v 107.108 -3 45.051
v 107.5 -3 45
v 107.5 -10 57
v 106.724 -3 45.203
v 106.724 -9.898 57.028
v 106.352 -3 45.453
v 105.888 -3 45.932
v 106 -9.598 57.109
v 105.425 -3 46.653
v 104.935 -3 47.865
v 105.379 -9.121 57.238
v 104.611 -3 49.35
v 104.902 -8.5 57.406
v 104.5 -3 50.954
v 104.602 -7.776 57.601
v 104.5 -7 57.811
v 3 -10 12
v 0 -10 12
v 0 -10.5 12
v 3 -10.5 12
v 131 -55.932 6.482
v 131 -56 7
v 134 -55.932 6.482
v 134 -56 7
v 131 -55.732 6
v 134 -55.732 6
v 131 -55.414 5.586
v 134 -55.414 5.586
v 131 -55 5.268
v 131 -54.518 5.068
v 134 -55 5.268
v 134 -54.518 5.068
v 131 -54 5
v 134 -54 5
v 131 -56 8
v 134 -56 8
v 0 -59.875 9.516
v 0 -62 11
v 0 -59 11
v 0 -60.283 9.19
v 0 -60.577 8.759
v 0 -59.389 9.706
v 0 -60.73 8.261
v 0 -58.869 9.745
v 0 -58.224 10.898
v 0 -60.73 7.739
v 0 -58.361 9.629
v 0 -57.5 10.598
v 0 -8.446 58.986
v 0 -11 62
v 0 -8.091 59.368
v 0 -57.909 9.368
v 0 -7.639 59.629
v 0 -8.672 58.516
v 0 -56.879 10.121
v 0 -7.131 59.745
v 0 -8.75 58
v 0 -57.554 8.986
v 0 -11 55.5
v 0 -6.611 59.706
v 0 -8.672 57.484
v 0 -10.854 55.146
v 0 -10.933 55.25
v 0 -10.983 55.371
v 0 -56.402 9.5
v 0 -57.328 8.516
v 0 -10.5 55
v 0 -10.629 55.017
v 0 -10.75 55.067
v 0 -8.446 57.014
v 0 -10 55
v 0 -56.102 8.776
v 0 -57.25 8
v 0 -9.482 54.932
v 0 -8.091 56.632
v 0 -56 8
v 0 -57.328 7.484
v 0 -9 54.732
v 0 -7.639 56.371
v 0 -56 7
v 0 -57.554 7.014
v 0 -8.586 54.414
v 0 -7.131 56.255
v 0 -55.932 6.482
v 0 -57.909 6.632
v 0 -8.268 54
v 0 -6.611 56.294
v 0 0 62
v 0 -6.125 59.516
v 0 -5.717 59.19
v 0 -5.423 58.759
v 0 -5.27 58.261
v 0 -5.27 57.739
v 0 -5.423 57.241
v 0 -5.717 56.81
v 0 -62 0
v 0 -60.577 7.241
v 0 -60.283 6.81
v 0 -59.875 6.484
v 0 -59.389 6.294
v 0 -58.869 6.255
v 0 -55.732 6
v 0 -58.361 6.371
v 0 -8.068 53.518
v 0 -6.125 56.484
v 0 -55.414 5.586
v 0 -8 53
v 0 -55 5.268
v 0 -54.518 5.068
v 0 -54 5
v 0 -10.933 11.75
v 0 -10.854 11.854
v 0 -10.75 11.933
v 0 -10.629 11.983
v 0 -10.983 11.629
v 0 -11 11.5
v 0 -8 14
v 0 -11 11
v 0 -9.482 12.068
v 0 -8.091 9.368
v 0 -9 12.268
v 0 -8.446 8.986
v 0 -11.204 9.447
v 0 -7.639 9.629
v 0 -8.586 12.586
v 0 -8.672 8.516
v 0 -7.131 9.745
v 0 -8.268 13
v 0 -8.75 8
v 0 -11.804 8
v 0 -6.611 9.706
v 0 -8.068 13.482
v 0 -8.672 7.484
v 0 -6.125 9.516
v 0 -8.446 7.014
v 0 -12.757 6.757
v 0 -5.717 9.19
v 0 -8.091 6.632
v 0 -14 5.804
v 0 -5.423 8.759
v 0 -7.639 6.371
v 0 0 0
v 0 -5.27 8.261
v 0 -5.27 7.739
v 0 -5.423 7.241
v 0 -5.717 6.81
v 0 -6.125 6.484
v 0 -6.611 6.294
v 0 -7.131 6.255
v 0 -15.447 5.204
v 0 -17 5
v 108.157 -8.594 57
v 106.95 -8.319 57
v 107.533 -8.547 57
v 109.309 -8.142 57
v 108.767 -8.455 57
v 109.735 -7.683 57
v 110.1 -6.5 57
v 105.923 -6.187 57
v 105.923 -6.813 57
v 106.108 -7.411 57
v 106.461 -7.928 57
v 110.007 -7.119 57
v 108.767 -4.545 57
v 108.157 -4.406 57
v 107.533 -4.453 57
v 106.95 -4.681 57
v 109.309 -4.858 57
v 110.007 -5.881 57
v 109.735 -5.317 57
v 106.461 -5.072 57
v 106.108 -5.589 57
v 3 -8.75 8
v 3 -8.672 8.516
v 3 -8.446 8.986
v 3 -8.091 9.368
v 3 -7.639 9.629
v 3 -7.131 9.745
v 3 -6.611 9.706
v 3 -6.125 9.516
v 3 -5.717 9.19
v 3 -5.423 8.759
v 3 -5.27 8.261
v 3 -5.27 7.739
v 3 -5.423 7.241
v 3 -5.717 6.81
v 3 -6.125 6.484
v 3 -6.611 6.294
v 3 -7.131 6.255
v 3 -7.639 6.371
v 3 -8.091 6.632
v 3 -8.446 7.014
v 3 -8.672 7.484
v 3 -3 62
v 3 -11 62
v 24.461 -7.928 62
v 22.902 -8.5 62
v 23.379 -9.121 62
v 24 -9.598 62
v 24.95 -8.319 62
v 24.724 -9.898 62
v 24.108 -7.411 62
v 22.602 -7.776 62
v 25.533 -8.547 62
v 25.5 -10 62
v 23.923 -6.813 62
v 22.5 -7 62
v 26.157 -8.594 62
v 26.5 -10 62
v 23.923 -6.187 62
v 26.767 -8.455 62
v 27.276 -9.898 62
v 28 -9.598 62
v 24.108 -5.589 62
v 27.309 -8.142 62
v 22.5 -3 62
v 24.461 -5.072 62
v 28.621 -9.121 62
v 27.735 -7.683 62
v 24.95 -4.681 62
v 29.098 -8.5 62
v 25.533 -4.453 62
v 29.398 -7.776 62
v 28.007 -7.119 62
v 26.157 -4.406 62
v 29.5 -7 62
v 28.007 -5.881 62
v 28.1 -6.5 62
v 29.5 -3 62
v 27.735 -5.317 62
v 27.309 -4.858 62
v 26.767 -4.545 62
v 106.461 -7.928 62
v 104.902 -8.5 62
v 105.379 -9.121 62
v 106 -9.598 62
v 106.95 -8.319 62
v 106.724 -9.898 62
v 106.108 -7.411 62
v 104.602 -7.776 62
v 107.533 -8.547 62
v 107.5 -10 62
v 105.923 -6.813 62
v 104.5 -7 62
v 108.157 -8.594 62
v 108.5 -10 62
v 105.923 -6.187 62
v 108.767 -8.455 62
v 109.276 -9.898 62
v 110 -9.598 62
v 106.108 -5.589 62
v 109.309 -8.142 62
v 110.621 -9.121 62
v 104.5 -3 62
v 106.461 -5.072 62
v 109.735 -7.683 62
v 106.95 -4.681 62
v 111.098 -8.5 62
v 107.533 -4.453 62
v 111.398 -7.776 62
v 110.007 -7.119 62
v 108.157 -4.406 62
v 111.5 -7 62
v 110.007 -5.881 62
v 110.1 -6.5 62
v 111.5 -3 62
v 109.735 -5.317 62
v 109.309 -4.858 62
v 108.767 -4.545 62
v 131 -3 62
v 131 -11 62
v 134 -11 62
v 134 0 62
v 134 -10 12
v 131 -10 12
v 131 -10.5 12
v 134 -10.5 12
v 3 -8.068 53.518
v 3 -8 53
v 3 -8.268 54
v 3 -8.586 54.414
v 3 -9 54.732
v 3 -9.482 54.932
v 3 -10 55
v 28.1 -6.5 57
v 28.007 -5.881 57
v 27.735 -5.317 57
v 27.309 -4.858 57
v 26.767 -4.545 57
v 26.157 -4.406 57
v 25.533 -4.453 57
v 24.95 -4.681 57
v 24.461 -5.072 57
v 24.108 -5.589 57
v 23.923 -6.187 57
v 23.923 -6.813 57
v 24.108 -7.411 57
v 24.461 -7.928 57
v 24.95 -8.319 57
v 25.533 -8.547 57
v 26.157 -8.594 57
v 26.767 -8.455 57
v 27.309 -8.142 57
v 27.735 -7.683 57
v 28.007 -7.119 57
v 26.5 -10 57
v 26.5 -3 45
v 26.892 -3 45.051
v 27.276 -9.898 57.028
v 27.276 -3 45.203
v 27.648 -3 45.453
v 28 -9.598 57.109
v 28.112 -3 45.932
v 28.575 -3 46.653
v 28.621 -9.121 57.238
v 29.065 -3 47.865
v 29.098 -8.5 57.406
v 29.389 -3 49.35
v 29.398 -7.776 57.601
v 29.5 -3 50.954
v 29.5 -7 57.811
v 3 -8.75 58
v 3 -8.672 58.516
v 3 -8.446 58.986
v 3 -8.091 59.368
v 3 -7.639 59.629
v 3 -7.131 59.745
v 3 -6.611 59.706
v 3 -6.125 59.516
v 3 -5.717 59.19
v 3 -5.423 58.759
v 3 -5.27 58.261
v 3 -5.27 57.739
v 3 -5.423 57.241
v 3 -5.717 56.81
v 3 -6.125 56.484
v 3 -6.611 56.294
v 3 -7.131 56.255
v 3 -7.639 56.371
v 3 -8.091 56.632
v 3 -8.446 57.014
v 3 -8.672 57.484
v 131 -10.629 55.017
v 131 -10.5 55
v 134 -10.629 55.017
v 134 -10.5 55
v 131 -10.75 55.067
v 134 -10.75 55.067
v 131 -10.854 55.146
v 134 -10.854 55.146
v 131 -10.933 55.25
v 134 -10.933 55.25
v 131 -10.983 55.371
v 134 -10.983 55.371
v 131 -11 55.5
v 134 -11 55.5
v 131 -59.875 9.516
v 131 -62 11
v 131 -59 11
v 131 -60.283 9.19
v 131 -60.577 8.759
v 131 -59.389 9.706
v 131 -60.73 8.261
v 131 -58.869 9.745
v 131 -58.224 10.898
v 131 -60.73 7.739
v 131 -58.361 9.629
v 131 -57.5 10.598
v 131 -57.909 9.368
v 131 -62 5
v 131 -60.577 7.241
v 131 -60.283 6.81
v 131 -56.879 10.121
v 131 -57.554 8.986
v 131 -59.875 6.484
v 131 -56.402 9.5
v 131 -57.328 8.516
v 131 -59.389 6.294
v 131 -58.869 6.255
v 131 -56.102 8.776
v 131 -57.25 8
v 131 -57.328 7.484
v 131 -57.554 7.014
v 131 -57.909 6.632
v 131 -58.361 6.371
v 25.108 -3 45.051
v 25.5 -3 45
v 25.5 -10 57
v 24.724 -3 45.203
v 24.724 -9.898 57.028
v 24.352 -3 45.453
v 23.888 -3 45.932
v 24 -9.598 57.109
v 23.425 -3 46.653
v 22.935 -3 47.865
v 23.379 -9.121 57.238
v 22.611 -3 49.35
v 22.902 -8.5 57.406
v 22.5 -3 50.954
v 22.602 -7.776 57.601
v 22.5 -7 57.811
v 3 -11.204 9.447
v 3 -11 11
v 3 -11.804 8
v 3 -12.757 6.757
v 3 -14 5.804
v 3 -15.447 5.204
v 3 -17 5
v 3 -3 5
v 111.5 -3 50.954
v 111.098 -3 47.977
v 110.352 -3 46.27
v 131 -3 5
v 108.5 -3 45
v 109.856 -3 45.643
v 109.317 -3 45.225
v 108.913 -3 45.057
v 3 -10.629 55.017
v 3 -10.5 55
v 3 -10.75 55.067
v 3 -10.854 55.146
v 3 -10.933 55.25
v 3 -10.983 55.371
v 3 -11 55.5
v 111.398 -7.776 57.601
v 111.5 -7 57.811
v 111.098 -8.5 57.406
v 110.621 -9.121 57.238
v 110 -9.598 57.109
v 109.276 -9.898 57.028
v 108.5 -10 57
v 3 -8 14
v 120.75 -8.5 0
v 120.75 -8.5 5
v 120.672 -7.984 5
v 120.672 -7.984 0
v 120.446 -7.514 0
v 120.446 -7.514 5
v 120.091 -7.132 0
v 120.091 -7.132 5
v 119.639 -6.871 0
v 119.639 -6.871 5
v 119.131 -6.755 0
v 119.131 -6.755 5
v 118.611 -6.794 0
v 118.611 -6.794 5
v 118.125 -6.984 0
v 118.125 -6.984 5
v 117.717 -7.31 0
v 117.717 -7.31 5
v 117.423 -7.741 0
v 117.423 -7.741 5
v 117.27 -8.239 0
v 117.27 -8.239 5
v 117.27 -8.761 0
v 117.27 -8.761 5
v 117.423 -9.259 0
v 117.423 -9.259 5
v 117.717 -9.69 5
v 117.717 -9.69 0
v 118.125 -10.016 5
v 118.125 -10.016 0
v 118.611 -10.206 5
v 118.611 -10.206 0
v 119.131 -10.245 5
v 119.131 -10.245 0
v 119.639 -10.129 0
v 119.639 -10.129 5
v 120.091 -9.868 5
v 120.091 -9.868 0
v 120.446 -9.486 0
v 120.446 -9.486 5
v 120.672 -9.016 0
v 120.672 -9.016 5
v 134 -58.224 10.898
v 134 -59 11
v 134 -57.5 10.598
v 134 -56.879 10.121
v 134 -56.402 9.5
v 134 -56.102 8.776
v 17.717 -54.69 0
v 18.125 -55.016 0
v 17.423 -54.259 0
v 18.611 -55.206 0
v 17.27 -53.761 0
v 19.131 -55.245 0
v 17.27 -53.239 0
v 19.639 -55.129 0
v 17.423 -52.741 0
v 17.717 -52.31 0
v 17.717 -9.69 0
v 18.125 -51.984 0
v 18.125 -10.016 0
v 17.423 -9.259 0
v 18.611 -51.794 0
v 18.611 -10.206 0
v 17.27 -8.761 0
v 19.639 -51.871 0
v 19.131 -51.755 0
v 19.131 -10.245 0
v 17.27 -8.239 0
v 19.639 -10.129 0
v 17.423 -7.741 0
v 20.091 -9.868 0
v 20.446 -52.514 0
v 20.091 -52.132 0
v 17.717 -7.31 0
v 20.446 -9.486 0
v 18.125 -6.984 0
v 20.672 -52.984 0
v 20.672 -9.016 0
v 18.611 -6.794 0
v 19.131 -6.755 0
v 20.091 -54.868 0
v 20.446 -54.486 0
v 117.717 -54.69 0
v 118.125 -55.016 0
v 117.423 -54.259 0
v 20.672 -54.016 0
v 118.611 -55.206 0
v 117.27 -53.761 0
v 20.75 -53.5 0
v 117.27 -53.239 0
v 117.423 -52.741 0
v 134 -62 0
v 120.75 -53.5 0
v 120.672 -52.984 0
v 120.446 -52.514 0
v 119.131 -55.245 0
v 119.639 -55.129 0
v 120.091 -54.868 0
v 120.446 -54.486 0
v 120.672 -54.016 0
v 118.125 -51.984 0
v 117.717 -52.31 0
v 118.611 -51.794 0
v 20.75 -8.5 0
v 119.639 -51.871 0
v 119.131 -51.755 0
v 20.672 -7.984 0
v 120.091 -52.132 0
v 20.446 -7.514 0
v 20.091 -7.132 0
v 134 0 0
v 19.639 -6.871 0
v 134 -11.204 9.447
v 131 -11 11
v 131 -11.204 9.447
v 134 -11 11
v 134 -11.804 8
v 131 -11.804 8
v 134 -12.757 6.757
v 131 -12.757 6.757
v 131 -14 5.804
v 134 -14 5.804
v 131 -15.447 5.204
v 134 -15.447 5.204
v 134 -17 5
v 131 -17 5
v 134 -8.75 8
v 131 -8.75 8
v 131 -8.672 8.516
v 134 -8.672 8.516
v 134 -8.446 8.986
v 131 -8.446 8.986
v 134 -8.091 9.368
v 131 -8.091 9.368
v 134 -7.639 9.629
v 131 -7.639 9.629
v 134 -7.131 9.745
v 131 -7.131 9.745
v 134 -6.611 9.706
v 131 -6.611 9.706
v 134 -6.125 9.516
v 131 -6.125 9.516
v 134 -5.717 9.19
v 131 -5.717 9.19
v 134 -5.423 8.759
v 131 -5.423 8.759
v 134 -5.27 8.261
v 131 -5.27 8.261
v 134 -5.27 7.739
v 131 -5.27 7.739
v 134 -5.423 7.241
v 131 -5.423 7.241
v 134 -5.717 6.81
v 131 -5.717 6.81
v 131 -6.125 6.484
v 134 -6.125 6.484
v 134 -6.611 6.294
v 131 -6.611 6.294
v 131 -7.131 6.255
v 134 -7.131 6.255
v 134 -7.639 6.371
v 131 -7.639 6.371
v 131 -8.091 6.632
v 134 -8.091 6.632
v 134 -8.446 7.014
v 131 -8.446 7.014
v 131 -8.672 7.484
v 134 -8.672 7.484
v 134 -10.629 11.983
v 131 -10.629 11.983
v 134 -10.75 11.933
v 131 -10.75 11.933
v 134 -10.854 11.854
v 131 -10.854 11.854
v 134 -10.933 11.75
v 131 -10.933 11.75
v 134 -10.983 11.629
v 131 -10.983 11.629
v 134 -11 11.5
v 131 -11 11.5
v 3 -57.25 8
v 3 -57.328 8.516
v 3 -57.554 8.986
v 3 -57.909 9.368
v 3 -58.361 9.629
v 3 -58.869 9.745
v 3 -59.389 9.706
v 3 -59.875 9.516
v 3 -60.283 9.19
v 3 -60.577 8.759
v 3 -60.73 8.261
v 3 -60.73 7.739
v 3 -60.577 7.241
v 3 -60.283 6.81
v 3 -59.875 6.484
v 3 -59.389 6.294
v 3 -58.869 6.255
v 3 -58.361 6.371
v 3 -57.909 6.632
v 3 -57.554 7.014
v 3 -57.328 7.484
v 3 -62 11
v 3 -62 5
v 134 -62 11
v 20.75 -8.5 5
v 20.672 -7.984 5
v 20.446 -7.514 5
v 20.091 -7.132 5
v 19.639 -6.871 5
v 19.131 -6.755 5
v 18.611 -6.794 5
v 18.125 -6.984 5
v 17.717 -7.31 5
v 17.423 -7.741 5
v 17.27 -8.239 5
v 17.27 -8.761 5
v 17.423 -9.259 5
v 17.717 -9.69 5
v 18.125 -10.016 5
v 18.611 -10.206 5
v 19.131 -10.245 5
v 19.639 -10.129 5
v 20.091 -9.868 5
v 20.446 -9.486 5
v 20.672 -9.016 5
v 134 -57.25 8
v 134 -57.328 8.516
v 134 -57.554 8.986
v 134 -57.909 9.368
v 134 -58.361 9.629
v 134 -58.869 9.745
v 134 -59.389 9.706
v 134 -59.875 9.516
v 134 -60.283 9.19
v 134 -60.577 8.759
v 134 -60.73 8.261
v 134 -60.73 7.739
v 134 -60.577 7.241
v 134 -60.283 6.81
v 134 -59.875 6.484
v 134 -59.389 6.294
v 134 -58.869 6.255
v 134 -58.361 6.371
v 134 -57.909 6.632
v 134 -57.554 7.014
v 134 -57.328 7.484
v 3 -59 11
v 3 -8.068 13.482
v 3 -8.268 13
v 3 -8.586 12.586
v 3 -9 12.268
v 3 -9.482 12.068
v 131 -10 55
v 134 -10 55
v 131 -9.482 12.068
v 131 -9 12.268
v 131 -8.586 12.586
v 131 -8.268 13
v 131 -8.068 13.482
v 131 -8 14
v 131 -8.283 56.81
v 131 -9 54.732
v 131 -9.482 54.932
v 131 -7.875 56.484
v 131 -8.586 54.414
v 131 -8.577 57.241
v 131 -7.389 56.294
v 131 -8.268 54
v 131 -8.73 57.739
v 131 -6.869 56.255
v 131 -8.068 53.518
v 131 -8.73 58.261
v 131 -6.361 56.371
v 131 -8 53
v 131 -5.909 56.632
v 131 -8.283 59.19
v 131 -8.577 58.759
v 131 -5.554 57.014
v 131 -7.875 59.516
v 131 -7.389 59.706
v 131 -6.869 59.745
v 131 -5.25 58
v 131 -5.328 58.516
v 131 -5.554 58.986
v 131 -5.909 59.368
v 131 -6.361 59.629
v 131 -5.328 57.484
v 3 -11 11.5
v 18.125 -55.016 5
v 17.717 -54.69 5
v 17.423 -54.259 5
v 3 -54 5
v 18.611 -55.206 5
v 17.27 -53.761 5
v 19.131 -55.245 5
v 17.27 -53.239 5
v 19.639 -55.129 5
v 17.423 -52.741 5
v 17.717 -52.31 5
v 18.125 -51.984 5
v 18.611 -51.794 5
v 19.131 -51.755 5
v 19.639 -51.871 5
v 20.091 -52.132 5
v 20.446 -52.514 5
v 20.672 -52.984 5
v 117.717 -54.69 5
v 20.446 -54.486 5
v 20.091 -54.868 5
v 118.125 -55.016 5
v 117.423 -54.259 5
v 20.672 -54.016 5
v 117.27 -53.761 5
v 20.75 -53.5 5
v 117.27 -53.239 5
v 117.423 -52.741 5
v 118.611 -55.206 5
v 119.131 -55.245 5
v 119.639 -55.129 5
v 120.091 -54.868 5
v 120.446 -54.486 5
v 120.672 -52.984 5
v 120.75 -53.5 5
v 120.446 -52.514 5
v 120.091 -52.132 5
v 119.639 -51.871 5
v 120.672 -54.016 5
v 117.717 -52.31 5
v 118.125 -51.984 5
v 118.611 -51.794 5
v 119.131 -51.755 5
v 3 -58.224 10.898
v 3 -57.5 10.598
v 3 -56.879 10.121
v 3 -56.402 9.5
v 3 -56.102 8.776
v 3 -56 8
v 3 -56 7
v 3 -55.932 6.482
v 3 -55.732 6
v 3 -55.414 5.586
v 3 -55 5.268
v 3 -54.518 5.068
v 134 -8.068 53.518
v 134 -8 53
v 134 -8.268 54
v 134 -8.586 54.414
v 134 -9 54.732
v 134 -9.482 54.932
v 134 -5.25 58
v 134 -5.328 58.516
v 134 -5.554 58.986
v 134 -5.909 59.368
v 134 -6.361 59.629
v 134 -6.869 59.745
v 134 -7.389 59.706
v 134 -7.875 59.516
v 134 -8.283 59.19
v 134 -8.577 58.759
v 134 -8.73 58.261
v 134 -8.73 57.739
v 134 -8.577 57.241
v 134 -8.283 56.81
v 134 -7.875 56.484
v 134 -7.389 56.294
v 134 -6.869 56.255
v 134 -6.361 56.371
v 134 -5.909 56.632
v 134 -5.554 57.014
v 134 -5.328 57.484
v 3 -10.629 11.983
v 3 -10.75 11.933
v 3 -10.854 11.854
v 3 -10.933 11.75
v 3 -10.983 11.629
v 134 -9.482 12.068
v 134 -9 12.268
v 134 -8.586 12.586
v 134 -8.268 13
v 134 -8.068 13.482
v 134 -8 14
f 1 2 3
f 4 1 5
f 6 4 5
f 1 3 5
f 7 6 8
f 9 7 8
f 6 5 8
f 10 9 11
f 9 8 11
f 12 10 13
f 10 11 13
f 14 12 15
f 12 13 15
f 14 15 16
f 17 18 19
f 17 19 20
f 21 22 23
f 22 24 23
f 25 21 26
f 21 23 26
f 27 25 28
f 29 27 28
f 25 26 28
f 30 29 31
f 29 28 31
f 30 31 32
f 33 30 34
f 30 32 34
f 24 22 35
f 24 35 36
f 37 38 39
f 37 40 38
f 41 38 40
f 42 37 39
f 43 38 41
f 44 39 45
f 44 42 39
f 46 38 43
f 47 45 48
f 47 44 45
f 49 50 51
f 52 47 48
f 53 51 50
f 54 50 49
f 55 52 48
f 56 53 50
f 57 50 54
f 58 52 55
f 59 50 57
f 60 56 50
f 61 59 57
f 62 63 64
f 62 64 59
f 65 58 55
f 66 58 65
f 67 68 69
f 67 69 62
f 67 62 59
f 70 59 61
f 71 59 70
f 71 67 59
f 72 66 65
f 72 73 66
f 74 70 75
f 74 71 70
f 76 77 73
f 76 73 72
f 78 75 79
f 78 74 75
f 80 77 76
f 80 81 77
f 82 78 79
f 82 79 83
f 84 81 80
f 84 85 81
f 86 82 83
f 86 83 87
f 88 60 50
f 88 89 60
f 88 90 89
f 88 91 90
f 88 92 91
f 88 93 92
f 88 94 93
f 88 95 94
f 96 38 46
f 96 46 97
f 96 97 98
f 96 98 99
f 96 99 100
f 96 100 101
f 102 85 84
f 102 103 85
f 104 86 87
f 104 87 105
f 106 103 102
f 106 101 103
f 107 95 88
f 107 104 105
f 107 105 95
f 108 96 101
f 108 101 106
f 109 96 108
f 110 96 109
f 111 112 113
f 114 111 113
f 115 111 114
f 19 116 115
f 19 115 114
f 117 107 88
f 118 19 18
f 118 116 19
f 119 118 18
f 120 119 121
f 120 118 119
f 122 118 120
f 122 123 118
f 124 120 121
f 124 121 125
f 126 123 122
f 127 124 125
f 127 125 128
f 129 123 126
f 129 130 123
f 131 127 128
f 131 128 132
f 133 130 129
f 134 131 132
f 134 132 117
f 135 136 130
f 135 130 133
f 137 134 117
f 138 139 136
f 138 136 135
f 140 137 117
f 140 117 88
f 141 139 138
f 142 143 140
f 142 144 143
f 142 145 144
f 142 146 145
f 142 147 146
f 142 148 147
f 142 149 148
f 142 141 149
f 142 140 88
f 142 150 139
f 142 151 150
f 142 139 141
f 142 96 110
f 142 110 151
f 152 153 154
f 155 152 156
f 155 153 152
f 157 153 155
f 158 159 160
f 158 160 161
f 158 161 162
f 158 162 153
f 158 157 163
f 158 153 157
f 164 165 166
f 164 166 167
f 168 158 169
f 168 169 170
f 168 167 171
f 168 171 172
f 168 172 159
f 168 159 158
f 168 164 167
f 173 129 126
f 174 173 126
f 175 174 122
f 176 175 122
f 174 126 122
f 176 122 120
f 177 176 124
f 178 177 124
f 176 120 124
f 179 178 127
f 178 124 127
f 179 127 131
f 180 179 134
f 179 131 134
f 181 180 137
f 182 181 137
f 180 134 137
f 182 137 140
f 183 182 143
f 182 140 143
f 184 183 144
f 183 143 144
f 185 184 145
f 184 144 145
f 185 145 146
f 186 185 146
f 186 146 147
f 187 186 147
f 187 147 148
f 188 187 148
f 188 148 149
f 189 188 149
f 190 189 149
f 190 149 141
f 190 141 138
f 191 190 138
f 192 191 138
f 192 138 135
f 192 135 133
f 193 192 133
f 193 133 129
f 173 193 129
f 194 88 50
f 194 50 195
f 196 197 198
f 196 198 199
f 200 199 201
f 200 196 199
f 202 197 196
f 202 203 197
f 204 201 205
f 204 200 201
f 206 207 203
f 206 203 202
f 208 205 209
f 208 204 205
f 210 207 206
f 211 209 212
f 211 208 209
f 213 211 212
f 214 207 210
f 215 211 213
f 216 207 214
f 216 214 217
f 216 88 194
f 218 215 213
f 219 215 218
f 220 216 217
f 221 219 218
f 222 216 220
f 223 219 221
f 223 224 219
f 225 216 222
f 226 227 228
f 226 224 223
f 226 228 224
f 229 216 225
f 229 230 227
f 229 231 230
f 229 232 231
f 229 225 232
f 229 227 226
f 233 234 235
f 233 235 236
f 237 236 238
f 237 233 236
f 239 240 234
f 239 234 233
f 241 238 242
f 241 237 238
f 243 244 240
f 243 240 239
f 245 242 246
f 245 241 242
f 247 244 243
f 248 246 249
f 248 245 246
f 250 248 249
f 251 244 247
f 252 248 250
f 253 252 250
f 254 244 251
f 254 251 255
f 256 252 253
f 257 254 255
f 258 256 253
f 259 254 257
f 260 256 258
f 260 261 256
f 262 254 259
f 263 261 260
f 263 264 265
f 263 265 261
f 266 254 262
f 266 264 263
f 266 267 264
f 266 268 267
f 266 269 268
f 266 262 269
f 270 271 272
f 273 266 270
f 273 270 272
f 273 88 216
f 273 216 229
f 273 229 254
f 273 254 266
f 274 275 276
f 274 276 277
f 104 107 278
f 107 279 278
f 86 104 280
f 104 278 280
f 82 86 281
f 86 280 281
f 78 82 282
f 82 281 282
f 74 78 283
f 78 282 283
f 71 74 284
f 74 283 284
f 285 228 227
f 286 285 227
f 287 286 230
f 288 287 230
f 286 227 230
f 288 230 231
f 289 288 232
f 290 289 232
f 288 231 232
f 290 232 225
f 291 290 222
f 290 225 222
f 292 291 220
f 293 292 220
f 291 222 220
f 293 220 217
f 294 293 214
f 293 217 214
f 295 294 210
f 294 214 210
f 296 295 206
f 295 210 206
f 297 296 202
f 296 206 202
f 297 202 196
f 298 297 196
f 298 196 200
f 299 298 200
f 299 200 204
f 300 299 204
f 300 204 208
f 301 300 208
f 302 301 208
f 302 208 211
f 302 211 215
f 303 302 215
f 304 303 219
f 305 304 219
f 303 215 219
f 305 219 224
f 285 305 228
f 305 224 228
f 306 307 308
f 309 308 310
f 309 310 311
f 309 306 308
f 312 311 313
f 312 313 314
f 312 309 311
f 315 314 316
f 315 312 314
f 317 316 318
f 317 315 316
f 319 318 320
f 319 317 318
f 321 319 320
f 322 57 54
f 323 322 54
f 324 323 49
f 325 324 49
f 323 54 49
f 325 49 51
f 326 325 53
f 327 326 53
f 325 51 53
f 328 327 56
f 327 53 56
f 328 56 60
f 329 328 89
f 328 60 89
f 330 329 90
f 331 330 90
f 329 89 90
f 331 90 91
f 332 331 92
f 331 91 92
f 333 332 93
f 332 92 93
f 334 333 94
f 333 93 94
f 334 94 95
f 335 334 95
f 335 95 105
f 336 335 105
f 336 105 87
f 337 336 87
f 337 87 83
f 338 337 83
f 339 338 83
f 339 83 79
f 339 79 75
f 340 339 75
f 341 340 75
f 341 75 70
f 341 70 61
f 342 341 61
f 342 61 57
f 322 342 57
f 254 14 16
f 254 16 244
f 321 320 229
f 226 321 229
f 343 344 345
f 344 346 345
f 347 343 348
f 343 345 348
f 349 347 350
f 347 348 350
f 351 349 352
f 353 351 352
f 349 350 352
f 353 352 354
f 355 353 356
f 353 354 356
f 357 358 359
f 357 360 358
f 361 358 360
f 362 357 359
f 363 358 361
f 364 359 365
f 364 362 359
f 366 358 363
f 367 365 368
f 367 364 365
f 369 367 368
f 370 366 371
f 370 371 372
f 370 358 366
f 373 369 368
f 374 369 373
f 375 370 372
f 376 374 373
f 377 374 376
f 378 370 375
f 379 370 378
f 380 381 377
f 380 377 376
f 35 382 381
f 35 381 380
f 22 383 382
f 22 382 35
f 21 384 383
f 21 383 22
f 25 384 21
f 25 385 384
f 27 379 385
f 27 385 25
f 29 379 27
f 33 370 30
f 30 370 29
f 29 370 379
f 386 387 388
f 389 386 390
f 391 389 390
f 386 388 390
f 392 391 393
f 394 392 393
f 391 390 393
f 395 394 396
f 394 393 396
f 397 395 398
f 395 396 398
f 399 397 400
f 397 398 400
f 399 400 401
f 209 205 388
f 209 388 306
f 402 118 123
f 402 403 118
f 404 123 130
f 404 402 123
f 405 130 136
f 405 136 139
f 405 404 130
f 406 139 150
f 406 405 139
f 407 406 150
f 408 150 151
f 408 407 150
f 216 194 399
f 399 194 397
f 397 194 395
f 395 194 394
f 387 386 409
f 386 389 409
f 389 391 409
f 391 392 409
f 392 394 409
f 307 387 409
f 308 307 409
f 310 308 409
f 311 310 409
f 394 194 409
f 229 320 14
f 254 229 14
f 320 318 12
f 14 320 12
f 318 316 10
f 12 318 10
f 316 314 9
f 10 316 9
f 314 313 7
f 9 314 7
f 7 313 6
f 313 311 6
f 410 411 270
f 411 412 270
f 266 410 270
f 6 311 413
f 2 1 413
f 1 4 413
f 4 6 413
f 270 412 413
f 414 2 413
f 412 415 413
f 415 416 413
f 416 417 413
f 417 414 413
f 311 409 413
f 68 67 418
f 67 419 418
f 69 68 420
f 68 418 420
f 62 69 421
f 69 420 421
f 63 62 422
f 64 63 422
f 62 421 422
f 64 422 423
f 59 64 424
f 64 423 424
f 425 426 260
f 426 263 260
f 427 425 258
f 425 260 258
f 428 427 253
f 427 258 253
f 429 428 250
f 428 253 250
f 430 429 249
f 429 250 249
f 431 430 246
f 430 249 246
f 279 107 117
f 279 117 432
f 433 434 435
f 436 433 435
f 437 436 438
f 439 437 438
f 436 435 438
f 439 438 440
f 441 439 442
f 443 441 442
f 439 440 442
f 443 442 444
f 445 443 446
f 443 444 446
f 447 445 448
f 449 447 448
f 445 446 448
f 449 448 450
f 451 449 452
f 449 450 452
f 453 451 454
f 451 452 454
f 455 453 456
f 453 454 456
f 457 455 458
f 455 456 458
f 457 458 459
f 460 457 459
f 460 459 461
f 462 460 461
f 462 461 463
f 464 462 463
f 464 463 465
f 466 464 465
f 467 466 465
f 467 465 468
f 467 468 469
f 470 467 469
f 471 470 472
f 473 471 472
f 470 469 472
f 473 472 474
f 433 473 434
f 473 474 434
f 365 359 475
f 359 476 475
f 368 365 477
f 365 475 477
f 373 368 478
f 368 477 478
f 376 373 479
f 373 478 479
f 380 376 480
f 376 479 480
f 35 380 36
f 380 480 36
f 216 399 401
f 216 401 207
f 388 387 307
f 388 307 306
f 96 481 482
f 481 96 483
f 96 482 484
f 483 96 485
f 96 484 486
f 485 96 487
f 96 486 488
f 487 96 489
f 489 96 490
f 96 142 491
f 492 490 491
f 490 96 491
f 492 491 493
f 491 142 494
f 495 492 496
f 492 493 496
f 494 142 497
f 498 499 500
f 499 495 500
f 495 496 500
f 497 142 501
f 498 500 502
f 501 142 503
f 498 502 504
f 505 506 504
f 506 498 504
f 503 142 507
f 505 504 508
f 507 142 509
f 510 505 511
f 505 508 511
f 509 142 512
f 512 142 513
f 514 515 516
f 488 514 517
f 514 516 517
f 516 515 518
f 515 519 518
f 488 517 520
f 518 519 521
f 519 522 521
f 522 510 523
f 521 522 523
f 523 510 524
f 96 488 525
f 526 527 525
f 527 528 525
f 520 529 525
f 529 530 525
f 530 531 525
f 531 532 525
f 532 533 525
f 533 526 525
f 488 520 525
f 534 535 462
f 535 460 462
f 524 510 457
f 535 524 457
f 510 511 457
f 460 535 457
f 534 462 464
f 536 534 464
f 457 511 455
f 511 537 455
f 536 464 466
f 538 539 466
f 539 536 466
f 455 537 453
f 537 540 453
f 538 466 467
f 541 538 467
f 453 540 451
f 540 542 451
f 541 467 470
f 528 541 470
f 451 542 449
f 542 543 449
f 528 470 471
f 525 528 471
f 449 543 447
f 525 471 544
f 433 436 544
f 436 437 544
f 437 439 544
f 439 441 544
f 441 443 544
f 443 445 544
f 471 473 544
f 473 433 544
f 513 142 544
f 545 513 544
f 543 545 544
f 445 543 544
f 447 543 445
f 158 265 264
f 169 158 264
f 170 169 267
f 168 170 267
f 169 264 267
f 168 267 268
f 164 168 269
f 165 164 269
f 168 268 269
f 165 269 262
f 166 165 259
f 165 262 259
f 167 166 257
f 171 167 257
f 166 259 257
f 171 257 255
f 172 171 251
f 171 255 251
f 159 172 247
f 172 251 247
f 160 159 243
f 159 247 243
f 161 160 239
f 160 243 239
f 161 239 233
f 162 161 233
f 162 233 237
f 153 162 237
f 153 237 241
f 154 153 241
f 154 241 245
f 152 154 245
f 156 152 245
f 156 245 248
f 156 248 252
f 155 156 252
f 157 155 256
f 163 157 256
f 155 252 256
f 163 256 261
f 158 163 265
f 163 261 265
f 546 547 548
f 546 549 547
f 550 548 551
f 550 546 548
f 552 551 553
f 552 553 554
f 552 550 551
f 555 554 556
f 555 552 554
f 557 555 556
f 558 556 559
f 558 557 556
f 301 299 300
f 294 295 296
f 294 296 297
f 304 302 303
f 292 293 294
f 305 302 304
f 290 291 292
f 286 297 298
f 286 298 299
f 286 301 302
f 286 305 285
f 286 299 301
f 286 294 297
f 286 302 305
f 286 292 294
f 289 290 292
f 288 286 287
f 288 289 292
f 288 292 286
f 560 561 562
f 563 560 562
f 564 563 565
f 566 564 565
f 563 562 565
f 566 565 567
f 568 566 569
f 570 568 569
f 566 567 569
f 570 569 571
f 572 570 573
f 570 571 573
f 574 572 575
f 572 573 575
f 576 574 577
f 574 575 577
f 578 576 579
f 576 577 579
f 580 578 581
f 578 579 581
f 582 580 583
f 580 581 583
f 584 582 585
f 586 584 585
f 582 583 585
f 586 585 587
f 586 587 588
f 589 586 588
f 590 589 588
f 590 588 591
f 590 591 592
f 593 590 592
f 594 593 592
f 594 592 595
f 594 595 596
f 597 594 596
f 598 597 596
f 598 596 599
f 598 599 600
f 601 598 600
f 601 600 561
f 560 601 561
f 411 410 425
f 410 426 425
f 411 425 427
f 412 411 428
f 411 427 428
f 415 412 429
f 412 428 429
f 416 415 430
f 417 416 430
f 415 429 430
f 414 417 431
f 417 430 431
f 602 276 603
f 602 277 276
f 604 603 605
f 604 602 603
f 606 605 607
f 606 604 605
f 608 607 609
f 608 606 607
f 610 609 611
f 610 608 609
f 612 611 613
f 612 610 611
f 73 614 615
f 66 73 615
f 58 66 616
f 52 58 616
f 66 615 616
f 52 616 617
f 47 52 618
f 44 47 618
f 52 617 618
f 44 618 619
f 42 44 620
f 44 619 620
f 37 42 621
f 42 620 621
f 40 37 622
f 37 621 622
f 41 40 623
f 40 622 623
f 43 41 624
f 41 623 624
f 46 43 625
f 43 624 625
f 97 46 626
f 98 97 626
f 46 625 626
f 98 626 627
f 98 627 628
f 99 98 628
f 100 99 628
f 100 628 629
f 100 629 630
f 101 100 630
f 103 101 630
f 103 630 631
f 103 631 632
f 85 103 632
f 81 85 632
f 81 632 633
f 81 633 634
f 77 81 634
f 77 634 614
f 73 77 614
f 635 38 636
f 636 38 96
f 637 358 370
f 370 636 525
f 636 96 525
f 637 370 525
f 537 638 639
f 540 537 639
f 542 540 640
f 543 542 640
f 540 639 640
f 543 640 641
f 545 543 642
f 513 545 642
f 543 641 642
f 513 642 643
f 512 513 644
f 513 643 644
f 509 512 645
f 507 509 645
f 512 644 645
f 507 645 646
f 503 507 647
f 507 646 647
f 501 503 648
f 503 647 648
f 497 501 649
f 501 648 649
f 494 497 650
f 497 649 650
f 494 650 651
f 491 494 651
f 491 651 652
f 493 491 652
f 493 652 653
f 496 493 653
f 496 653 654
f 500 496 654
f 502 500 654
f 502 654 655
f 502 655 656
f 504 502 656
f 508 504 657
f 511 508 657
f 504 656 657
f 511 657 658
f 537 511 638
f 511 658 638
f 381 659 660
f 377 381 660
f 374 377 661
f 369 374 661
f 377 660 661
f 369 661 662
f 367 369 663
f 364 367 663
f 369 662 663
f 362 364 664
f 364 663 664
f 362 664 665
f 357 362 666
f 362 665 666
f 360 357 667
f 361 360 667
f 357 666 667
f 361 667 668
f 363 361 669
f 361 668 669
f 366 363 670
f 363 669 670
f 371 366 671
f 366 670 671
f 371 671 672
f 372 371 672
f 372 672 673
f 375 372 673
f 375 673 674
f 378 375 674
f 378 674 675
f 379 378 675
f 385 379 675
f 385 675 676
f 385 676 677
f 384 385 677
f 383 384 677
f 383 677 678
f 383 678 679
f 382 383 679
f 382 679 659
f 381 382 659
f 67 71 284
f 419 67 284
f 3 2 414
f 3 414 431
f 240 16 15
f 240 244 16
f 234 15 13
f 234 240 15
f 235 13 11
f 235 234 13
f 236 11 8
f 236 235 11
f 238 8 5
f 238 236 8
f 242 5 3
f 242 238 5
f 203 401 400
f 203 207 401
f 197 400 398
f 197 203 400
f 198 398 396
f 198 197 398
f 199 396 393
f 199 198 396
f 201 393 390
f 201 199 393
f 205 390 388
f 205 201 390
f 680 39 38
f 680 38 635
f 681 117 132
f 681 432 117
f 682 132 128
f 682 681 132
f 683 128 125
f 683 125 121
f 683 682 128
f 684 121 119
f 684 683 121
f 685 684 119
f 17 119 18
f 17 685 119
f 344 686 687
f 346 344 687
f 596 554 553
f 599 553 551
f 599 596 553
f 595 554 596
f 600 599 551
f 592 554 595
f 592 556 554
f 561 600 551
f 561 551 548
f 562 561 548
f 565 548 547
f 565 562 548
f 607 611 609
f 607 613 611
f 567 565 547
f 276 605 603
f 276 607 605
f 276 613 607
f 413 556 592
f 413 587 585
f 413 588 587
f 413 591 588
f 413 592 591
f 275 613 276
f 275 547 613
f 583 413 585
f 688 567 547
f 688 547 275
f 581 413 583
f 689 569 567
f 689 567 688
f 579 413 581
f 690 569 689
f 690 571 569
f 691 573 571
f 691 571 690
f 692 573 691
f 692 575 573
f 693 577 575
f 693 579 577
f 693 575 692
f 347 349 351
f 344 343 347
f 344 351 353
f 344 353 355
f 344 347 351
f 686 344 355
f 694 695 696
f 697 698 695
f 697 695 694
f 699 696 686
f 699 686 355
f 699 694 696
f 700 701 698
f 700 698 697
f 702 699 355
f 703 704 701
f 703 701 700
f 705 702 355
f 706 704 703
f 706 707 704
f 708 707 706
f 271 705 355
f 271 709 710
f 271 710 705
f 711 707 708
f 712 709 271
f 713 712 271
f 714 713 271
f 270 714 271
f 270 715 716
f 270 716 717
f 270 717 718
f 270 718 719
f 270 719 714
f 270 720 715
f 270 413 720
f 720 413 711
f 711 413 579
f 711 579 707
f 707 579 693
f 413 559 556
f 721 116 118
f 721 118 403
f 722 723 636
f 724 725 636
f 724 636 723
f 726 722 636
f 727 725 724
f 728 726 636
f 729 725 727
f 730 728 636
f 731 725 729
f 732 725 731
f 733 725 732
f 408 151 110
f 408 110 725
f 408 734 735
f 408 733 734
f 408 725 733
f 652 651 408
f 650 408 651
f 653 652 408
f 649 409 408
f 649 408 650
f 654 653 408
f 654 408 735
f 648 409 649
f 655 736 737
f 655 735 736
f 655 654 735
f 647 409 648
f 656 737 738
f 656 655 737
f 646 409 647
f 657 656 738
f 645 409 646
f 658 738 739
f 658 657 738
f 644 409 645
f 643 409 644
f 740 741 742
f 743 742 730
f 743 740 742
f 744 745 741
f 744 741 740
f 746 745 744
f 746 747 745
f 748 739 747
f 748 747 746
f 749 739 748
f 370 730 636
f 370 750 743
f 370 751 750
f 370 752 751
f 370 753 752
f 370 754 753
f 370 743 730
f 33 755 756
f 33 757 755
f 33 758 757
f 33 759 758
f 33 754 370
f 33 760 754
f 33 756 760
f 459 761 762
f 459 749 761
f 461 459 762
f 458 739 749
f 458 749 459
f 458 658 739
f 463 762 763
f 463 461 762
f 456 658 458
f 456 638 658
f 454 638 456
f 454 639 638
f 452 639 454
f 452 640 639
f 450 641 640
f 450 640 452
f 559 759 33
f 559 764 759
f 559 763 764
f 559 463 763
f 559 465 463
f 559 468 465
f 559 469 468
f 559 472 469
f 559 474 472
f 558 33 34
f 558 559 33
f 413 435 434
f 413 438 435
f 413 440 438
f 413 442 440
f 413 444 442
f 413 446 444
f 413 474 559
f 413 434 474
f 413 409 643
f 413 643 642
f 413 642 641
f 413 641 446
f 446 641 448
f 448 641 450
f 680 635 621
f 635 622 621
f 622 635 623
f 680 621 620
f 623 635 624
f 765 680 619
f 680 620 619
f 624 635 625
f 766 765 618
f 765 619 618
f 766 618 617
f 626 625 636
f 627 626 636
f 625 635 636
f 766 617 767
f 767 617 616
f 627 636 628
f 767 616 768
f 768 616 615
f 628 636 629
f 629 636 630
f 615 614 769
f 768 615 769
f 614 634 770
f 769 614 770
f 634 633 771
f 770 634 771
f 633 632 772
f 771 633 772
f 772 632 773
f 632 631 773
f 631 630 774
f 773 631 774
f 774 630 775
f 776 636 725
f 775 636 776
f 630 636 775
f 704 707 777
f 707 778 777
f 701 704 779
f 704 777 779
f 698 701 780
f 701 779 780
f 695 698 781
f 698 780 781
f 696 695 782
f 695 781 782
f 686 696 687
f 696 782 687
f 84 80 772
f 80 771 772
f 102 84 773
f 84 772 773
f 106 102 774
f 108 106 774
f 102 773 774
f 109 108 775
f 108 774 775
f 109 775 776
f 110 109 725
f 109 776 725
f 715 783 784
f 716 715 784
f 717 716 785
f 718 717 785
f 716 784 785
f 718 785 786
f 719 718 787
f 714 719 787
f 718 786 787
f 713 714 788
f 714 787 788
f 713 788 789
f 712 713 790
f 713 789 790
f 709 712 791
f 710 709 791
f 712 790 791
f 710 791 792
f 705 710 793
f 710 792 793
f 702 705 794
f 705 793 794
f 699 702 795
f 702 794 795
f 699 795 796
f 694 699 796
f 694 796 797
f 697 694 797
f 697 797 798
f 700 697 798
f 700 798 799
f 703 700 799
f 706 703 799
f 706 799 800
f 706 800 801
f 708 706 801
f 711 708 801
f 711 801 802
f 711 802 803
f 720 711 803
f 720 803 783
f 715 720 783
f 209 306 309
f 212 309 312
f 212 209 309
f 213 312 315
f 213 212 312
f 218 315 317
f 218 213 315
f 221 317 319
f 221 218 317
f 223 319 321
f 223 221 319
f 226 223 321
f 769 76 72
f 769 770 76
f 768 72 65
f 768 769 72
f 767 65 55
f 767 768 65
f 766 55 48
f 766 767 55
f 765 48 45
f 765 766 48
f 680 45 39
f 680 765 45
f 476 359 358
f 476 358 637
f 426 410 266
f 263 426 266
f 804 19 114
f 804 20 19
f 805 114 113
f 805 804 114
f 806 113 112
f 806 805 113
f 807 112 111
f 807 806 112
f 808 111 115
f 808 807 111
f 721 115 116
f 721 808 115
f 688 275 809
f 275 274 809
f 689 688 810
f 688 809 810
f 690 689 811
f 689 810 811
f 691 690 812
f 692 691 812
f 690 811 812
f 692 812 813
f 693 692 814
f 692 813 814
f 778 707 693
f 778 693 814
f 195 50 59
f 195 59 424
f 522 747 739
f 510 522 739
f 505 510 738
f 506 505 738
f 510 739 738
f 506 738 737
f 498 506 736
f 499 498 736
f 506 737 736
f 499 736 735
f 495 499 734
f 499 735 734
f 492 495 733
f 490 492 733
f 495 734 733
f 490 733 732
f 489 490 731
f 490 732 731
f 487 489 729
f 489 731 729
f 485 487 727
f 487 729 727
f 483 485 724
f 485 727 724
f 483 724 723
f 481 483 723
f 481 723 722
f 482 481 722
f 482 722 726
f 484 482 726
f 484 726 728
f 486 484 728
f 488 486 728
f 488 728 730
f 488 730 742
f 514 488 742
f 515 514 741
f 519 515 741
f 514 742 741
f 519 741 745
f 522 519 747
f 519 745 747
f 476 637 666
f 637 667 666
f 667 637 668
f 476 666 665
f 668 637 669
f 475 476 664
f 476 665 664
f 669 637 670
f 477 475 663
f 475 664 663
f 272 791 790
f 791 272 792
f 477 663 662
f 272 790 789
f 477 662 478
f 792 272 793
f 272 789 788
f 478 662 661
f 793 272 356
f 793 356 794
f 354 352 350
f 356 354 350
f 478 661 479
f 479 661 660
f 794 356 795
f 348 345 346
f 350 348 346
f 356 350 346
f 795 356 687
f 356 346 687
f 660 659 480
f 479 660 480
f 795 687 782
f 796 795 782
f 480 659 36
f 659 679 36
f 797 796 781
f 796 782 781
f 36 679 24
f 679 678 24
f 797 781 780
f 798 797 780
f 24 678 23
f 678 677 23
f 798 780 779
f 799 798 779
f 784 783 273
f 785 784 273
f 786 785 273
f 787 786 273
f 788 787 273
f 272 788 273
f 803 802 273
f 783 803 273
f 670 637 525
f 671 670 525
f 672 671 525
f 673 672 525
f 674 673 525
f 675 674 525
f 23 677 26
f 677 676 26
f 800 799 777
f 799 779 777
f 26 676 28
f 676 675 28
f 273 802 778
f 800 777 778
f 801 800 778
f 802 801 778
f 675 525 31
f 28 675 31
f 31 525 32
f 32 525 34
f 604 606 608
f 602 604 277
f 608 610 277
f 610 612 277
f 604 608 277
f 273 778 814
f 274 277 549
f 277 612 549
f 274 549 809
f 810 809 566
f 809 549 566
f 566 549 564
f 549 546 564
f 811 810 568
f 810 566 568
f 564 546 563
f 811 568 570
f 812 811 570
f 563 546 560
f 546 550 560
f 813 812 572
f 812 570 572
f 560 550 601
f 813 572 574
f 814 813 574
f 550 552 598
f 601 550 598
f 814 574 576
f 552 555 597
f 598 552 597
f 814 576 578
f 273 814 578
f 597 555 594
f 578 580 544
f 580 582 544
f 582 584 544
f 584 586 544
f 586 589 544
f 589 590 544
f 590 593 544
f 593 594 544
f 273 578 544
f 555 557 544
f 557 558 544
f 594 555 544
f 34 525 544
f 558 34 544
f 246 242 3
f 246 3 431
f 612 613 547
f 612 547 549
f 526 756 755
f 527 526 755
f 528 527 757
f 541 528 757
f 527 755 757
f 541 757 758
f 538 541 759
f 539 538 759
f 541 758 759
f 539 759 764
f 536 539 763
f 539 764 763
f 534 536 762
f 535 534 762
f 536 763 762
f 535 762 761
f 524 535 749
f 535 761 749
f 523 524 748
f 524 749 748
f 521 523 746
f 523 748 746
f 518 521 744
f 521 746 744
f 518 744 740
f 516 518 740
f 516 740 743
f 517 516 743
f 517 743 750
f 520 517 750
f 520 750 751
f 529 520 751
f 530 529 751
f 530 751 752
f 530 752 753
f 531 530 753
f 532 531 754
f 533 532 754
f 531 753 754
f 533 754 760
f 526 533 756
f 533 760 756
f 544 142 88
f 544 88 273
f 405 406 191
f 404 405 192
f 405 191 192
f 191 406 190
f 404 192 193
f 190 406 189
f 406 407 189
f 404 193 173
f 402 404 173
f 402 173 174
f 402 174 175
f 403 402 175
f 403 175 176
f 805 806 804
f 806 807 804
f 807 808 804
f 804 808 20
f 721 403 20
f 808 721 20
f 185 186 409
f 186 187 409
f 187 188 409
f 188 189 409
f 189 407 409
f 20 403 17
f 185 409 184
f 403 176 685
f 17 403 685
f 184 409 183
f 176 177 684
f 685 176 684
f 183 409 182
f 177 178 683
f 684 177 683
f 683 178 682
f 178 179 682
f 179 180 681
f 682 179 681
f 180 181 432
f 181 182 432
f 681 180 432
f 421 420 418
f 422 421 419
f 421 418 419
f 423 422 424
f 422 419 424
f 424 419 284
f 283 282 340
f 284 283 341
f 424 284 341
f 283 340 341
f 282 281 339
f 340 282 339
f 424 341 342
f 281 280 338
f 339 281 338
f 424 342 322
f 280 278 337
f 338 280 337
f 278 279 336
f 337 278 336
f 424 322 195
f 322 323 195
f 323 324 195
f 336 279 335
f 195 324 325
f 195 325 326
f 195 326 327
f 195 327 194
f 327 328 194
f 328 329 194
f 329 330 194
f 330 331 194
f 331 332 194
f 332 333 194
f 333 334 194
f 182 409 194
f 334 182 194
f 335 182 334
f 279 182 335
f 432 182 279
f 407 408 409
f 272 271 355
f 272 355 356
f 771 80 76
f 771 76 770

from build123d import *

# Parameters (mm, degrees)
SKETCH_W        = 134
SKETCH_H        = 62
PAD_DEPTH       = 5
SKETCH001_W     = 134
SKETCH001_H     = 3
PAD001_DEPTH    = 57
SKETCH002_W     = 7
SKETCH002_H     = 17
PAD002_DEPTH    = 7
POCKET_DEPTH    = 89
FILLET_R        = 3
SKETCH004_W     = 3
SKETCH004_H     = 57
PAD003_DEPTH    = 5
SKETCH005_W     = 3
SKETCH005_H     = 7
PAD004_DEPTH    = 3
SKETCH006_R     = 1.75
POCKET001_DEPTH = 134.001
SKETCH007_R     = 1.75
POCKET002_DEPTH = 5
SKETCH008_R     = 1.75
POCKET003_DEPTH = 5
SKETCH009_W     = 3
SKETCH009_H     = 6
PAD005_DEPTH    = 6
SKETCH010_R     = 1.75
POCKET004_DEPTH = 134.001
FILLET001_R     = 3
FILLET002_R     = 2
FILLET003_R     = 3
FILLET004_R     = 2
FILLET005_R     = 6
FILLET006_R     = 6
FILLET007_R     = 2
FILLET008_R     = 0.5
FILLET009_R     = 2
FILLET010_R     = 0.5
FILLET011_R     = 2
FILLET012_R     = 0.5
FILLET013_R     = 2
FILLET014_R     = 0.5
SKETCH011_R     = 1.75
POCKET005_DEPTH = 5
SKETCH012_R     = 2.1
POCKET006_DEPTH = 5


with BuildPart() as part:
    # Sketch → Pad (new body)
    with BuildSketch(Plane.XY):
        with Locations((67, -31)):
            Rectangle(SKETCH_W, SKETCH_H)
    extrude(amount=PAD_DEPTH)

    # Sketch001 (on Face6 of Pad) → Pad001 (join)
    with BuildSketch(Plane.XY.offset(5)):
        with Locations((67, -1.5)):
            Rectangle(SKETCH001_W, SKETCH001_H)
    extrude(amount=PAD001_DEPTH)

    # Sketch002 (on Face11 of Pad001) → Pad002 (join)
    with BuildSketch(Plane.XZ.offset(3)):
        with Locations((26, 53.5)):
            Rectangle(SKETCH002_W, SKETCH002_H)
        with Locations((108, 53.5)):
            Rectangle(SKETCH002_W, SKETCH002_H)
    extrude(amount=PAD002_DEPTH)

    # Sketch003 (on Face14 of Pad002) → Pocket (cut)
    with BuildSketch(Plane(origin=(22.5, 0, 0), x_dir=(0, -1, 0), z_dir=(-1, 0, 0))):
        Polygon((3, 45), (10, 57), (10, 45), align=None)
    extrude(amount=-POCKET_DEPTH, mode=Mode.SUBTRACT)

    # Fillet
    fillet_edges = [part.edges().sort_by_distance(p)[0] for p in [
        (104.5, -10, 59.5),
        (111.5, -10, 59.5),
        (111.5, -6.5, 51),
        (104.5, -6.5, 51),
        (22.5, -10, 59.5),
        (29.5, -10, 59.5),
        (29.5, -6.5, 51),
        (22.5, -6.5, 51),
    ]]
    fillet(fillet_edges, radius=FILLET_R)

    # Sketch004 (on Face1 of Fillet) → Pad003 (join)
    with BuildSketch(Plane.XZ.offset(3)):
        with Locations((1.5, 33.5)):
            Rectangle(SKETCH004_W, SKETCH004_H)
        with Locations((132.5, 33.5)):
            Rectangle(SKETCH004_W, SKETCH004_H)
    extrude(amount=PAD003_DEPTH)

    # Sketch005 (on Face32 of Pad003) → Pad004 (join)
    with BuildSketch(Plane.XZ.offset(8)):
        with Locations((1.5, 8.5)):
            Rectangle(SKETCH005_W, SKETCH005_H)
        with Locations((1.5, 58.5)):
            Rectangle(SKETCH005_W, SKETCH005_H)
        with Locations((132.5, 8.5)):
            Rectangle(SKETCH005_W, SKETCH005_H)
        with Locations((132.5, 58.5)):
            Rectangle(SKETCH005_W, SKETCH005_H)
    extrude(amount=PAD004_DEPTH)

    # Sketch006 (on Face44 of Pad004) → Pocket001 (cut, through all)
    with BuildSketch(Plane(origin=(0, 0, 0), x_dir=(0, -1, 0), z_dir=(-1, 0, 0))):
        with Locations((7, 8)):
            Circle(SKETCH006_R)
    extrude(amount=-POCKET001_DEPTH, mode=Mode.SUBTRACT)

    # Sketch007 (on Face46 of Pocket001) → Pocket002 (cut)
    with BuildSketch(Plane(origin=(0, 0, 0), x_dir=(0, -1, 0), z_dir=(-1, 0, 0))):
        with Locations((7, 58)):
            Circle(SKETCH007_R)
    extrude(amount=-POCKET002_DEPTH, mode=Mode.SUBTRACT)

    # Sketch008 (on Face45 of Pocket002) → Pocket003 (cut)
    with BuildSketch(Plane.YZ.offset(134)):
        with Locations((-7, 58)):
            Circle(SKETCH008_R)
    extrude(amount=-POCKET003_DEPTH, mode=Mode.SUBTRACT)

    # Sketch009 (on Face10 of Pocket003) → Pad005 (join)
    with BuildSketch(Plane.XY.offset(5)):
        with Locations((1.5, -59)):
            Rectangle(SKETCH009_W, SKETCH009_H)
        with Locations((132.5, -59)):
            Rectangle(SKETCH009_W, SKETCH009_H)
    extrude(amount=PAD005_DEPTH)

    # Sketch010 (on Face60 of Pad005) → Pocket004 (cut, through all)
    with BuildSketch(Plane.YZ.offset(134)):
        with Locations((-59, 8)):
            Circle(SKETCH010_R)
    extrude(amount=-POCKET004_DEPTH, mode=Mode.SUBTRACT)

    # Fillet001
    fillet001_edges = [part.edges().sort_by_distance(p)[0] for p in [
        (132.5, -56, 11),
    ]]
    fillet(fillet001_edges, radius=FILLET001_R)

    # Fillet002
    fillet002_edges = [part.edges().sort_by_distance(p)[0] for p in [
        (132.5, -56, 5),
    ]]
    fillet(fillet002_edges, radius=FILLET002_R)

    # Fillet003
    fillet003_edges = [part.edges().sort_by_distance(p)[0] for p in [
        (1.5, -56, 11),
    ]]
    fillet(fillet003_edges, radius=FILLET003_R)

    # Fillet004
    fillet004_edges = [part.edges().sort_by_distance(p)[0] for p in [
        (1.5, -56, 5),
    ]]
    fillet(fillet004_edges, radius=FILLET004_R)

    # Fillet005
    fillet005_edges = [part.edges().sort_by_distance(p)[0] for p in [
        (1.5, -11, 5),
    ]]
    fillet(fillet005_edges, radius=FILLET005_R)

    # Fillet006
    fillet006_edges = [part.edges().sort_by_distance(p)[0] for p in [
        (132.5, -11, 5),
    ]]
    fillet(fillet006_edges, radius=FILLET006_R)

    # Fillet007
    fillet007_edges = [part.edges().sort_by_distance(p)[0] for p in [
        (1.5, -8, 12),
    ]]
    fillet(fillet007_edges, radius=FILLET007_R)

    # Fillet008
    fillet008_edges = [part.edges().sort_by_distance(p)[0] for p in [
        (1.5, -11, 12),
    ]]
    fillet(fillet008_edges, radius=FILLET008_R)

    # Fillet009
    fillet009_edges = [part.edges().sort_by_distance(p)[0] for p in [
        (132.5, -8, 12),
    ]]
    fillet(fillet009_edges, radius=FILLET009_R)

    # Fillet010
    fillet010_edges = [part.edges().sort_by_distance(p)[0] for p in [
        (132.5, -11, 12),
    ]]
    fillet(fillet010_edges, radius=FILLET010_R)

    # Fillet011
    fillet011_edges = [part.edges().sort_by_distance(p)[0] for p in [
        (1.5, -8, 55),
    ]]
    fillet(fillet011_edges, radius=FILLET011_R)

    # Fillet012
    fillet012_edges = [part.edges().sort_by_distance(p)[0] for p in [
        (1.5, -11, 55),
    ]]
    fillet(fillet012_edges, radius=FILLET012_R)

    # Fillet013
    fillet013_edges = [part.edges().sort_by_distance(p)[0] for p in [
        (132.5, -8, 55),
    ]]
    fillet(fillet013_edges, radius=FILLET013_R)

    # Fillet014
    fillet014_edges = [part.edges().sort_by_distance(p)[0] for p in [
        (132.5, -11, 55),
    ]]
    fillet(fillet014_edges, radius=FILLET014_R)

    # Sketch011 (on Face13 of Fillet014) → Pocket005 (cut)
    with BuildSketch(Plane.XY.offset(5)):
        with Locations((19, -8.5)):
            Circle(SKETCH011_R)
        with Locations((19, -53.5)):
            Circle(SKETCH011_R)
        with Locations((119, -53.5)):
            Circle(SKETCH011_R)
        with Locations((119, -8.5)):
            Circle(SKETCH011_R)
    extrude(amount=-POCKET005_DEPTH, mode=Mode.SUBTRACT)

    # Sketch012 (on Face73 of Pocket005) → Pocket006 (cut)
    with BuildSketch(Plane.XY.offset(62)):
        with Locations((26, -6.5)):
            Circle(SKETCH012_R)
        with Locations((108, -6.5)):
            Circle(SKETCH012_R)
    extrude(amount=-POCKET006_DEPTH, mode=Mode.SUBTRACT)


solid = part.part
